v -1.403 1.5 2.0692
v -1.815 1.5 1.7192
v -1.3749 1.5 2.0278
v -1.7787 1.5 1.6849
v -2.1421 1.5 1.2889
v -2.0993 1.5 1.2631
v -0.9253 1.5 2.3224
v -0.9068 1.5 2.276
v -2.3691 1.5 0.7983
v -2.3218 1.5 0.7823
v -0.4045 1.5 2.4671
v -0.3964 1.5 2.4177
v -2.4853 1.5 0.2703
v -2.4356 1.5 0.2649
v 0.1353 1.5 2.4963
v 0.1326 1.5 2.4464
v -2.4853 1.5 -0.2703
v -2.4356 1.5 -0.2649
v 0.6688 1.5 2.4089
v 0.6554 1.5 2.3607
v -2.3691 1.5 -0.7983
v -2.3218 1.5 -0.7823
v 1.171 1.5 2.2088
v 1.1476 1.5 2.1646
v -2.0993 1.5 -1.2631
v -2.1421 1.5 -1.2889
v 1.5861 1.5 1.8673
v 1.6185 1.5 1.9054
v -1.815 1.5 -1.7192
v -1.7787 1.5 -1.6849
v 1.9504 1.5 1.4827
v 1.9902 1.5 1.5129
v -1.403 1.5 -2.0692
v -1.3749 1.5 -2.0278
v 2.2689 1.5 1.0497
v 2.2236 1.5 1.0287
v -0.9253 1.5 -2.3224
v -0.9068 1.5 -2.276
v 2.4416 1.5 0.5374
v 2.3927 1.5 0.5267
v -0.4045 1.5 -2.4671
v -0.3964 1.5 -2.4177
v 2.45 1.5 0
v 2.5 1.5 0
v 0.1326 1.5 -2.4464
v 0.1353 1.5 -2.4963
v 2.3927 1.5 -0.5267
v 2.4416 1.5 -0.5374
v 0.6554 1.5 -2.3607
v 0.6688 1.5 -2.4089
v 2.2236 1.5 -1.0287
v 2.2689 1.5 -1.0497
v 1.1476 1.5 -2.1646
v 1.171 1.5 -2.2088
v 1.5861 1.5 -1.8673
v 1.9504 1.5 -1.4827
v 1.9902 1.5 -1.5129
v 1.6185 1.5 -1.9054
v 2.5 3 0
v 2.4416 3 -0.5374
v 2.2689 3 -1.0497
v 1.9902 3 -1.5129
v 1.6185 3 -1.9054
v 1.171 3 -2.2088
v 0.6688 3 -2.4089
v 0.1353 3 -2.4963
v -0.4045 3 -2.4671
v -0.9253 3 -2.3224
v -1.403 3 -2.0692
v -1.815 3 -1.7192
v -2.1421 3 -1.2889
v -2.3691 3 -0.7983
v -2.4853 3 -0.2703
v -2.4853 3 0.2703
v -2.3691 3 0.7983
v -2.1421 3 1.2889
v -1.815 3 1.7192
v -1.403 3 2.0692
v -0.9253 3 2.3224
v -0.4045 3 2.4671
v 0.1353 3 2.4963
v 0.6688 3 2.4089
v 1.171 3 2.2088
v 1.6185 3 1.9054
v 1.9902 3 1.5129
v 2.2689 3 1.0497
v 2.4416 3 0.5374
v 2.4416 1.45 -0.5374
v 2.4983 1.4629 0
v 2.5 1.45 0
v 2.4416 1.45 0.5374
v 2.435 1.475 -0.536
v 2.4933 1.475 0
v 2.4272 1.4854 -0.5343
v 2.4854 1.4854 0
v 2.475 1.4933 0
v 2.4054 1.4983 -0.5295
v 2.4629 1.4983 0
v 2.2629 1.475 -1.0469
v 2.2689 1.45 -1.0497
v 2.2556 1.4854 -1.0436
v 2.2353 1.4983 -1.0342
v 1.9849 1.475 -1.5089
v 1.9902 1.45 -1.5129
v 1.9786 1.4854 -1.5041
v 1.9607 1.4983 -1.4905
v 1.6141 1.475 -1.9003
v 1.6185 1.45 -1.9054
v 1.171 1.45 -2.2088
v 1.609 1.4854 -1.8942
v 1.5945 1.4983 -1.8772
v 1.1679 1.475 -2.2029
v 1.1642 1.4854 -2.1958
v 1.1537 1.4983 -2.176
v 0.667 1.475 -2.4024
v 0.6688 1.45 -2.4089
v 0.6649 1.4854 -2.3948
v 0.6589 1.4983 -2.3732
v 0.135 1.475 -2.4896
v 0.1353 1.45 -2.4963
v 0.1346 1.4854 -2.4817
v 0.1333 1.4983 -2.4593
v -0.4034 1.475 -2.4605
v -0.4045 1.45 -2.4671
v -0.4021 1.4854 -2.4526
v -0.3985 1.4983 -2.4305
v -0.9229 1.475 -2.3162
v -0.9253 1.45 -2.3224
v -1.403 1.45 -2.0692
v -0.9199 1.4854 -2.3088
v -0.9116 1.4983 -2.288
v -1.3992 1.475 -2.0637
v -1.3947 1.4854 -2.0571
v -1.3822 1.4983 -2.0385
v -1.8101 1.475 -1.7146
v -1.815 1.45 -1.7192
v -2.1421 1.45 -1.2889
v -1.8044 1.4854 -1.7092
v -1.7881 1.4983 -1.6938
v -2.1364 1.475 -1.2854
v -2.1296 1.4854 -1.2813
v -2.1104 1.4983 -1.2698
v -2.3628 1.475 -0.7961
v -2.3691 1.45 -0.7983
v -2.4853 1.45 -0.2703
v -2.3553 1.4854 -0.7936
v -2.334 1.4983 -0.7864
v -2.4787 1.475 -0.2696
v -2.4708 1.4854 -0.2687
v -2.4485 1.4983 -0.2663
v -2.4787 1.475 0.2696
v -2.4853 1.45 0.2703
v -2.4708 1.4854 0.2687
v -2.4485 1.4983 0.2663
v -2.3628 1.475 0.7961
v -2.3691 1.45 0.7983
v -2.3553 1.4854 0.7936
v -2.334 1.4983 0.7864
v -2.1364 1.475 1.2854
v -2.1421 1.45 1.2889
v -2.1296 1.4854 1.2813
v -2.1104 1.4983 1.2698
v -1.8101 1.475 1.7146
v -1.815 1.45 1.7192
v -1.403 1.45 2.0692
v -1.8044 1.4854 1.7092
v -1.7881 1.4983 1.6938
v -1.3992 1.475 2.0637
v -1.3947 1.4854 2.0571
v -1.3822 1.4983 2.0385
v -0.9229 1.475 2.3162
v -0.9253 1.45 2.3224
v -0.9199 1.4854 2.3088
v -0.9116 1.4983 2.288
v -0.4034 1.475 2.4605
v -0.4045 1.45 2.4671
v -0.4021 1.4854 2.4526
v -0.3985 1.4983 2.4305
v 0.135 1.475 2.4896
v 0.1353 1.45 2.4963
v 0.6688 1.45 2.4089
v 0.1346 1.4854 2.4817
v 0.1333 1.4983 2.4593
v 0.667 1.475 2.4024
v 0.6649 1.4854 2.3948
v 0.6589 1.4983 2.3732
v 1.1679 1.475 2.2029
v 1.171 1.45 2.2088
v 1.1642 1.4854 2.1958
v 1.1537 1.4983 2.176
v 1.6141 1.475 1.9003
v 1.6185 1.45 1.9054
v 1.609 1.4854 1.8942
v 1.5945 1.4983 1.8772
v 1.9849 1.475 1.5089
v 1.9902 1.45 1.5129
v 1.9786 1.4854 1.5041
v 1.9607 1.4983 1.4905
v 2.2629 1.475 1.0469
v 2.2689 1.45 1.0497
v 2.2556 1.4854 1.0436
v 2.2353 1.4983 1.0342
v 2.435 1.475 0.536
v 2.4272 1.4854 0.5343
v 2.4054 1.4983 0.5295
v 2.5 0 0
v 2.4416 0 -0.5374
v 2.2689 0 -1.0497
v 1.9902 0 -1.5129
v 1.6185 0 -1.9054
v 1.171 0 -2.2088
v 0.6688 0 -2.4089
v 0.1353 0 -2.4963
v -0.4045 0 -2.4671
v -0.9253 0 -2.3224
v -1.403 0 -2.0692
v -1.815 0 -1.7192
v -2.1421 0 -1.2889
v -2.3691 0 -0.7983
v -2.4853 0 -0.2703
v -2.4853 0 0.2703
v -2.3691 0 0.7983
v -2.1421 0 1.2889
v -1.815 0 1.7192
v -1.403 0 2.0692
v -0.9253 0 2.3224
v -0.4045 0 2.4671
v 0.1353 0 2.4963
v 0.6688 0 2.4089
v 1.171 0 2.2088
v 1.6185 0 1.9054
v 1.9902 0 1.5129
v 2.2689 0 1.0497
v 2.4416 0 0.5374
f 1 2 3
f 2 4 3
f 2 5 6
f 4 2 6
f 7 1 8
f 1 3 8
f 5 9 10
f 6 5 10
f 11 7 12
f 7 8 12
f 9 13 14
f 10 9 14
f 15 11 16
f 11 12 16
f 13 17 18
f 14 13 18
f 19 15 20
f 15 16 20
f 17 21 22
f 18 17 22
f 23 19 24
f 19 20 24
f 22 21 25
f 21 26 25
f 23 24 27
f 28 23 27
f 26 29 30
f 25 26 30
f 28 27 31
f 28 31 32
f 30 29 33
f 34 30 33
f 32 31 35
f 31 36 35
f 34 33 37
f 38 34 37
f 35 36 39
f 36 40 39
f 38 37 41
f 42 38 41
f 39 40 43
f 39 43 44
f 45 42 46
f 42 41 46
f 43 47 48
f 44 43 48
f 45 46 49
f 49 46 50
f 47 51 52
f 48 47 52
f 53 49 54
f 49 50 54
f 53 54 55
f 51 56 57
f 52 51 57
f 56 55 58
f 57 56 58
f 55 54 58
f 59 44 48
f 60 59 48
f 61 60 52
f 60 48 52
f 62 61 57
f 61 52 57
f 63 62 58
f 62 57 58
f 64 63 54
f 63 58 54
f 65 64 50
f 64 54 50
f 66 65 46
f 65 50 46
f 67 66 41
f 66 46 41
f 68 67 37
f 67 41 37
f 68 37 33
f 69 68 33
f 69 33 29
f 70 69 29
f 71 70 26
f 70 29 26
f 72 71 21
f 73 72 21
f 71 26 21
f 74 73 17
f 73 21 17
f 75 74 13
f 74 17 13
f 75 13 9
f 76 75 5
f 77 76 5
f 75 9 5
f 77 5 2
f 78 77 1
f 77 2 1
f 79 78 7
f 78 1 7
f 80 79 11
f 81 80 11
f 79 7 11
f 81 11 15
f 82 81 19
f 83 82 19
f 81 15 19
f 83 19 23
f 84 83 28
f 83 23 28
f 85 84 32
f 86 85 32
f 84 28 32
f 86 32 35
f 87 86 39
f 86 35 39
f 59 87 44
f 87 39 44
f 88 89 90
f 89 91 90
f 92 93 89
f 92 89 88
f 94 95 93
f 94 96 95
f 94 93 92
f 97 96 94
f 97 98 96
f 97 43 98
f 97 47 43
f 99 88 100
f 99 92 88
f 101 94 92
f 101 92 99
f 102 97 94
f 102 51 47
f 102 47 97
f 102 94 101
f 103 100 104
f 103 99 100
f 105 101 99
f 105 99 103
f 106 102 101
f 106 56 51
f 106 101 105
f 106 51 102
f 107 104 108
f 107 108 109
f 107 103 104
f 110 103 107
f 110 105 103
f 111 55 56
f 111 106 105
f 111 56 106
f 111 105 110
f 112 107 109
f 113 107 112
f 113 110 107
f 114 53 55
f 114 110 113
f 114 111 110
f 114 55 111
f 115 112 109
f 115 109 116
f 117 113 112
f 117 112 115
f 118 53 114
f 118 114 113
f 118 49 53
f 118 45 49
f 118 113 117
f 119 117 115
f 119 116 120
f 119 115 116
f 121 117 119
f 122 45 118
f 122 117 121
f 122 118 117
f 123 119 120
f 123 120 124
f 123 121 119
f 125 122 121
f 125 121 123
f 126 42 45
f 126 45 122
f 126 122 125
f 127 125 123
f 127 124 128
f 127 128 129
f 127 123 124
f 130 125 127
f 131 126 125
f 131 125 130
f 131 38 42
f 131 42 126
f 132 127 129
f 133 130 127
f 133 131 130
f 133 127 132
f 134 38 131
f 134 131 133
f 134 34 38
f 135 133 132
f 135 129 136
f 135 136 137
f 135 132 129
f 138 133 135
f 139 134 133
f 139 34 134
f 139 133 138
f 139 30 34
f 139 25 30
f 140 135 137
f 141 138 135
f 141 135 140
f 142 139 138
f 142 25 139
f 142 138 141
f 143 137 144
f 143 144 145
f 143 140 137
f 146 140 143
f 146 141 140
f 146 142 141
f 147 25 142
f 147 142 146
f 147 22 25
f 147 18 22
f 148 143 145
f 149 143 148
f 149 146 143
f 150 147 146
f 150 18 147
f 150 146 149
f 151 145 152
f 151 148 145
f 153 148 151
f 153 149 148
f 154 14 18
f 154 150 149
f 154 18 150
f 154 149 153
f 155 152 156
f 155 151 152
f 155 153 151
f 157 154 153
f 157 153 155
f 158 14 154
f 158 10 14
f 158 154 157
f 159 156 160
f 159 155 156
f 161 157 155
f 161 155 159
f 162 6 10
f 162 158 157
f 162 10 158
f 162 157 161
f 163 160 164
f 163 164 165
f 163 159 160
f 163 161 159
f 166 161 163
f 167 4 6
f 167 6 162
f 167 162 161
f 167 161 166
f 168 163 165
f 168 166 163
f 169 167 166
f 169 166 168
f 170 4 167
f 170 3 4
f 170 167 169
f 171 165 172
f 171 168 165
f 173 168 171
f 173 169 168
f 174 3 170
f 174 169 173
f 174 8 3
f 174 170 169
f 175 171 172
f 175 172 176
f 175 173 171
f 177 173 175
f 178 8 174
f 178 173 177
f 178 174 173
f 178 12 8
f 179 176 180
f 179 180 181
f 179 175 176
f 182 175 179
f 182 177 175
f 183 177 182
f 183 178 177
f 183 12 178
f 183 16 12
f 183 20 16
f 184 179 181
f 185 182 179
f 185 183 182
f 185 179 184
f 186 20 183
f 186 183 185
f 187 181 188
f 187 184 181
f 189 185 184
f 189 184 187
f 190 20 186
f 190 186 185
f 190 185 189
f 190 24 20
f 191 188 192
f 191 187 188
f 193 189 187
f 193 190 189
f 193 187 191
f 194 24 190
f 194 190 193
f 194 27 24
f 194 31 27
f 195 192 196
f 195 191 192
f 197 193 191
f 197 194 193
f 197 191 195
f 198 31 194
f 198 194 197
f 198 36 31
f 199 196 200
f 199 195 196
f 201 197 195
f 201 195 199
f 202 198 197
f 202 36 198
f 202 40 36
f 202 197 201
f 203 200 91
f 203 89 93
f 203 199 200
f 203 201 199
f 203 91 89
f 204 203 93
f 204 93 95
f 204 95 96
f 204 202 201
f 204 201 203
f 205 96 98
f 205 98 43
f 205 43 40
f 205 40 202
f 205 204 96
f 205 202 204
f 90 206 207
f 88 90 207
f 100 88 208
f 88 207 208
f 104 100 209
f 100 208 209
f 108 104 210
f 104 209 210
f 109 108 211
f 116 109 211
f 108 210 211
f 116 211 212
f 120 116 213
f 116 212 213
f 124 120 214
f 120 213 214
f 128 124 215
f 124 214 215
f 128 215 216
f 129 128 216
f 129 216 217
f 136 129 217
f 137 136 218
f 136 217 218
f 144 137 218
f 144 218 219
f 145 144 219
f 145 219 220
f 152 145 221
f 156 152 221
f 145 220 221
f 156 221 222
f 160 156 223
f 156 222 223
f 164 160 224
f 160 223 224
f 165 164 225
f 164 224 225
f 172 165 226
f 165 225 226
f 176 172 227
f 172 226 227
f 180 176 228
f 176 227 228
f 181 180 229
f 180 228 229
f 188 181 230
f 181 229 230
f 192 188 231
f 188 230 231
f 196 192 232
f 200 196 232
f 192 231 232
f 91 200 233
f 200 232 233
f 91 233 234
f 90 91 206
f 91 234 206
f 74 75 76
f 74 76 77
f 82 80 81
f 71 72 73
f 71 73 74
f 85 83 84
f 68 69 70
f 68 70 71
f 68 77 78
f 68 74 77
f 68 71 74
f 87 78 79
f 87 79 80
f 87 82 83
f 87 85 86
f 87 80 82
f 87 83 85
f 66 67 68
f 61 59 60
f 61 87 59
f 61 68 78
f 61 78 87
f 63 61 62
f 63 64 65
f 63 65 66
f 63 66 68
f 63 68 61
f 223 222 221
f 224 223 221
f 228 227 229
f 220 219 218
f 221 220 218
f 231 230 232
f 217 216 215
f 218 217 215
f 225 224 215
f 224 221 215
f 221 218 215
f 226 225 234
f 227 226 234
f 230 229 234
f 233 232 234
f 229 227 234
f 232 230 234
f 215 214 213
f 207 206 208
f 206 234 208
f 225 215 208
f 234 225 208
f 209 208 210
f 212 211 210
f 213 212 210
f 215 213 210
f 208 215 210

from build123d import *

# Parameters (mm, degrees)
SKETCH1_R           = 2.5
BOSS_EXTRUDE1_DEPTH = 1.5
FILLET1_R           = 0.05
SKETCH2_R           = 2.5
BOSS_EXTRUDE2_DEPTH = 1.5


with BuildPart() as part:
    # Sketch1 → Boss-Extrude1 (new body)
    with BuildSketch(Plane(origin=(0, 0, 0), x_dir=(1, 0, 0), z_dir=(0, 1, 0))):
        Circle(SKETCH1_R)
    extrude(amount=BOSS_EXTRUDE1_DEPTH)

    # Fillet1
    fillet1_edges = [part.edges().sort_by_distance(p)[0] for p in [
        (-2.5, 1.5, 0),
    ]]
    fillet(fillet1_edges, radius=FILLET1_R)

    # Sketch2 → Boss-Extrude2 (add)
    with BuildSketch(Plane(origin=(0, 1.5, 0), x_dir=(1, 0, 0), z_dir=(0, 1, 0))):
        Circle(SKETCH2_R)
    extrude(amount=BOSS_EXTRUDE2_DEPTH)


solid = part.part
